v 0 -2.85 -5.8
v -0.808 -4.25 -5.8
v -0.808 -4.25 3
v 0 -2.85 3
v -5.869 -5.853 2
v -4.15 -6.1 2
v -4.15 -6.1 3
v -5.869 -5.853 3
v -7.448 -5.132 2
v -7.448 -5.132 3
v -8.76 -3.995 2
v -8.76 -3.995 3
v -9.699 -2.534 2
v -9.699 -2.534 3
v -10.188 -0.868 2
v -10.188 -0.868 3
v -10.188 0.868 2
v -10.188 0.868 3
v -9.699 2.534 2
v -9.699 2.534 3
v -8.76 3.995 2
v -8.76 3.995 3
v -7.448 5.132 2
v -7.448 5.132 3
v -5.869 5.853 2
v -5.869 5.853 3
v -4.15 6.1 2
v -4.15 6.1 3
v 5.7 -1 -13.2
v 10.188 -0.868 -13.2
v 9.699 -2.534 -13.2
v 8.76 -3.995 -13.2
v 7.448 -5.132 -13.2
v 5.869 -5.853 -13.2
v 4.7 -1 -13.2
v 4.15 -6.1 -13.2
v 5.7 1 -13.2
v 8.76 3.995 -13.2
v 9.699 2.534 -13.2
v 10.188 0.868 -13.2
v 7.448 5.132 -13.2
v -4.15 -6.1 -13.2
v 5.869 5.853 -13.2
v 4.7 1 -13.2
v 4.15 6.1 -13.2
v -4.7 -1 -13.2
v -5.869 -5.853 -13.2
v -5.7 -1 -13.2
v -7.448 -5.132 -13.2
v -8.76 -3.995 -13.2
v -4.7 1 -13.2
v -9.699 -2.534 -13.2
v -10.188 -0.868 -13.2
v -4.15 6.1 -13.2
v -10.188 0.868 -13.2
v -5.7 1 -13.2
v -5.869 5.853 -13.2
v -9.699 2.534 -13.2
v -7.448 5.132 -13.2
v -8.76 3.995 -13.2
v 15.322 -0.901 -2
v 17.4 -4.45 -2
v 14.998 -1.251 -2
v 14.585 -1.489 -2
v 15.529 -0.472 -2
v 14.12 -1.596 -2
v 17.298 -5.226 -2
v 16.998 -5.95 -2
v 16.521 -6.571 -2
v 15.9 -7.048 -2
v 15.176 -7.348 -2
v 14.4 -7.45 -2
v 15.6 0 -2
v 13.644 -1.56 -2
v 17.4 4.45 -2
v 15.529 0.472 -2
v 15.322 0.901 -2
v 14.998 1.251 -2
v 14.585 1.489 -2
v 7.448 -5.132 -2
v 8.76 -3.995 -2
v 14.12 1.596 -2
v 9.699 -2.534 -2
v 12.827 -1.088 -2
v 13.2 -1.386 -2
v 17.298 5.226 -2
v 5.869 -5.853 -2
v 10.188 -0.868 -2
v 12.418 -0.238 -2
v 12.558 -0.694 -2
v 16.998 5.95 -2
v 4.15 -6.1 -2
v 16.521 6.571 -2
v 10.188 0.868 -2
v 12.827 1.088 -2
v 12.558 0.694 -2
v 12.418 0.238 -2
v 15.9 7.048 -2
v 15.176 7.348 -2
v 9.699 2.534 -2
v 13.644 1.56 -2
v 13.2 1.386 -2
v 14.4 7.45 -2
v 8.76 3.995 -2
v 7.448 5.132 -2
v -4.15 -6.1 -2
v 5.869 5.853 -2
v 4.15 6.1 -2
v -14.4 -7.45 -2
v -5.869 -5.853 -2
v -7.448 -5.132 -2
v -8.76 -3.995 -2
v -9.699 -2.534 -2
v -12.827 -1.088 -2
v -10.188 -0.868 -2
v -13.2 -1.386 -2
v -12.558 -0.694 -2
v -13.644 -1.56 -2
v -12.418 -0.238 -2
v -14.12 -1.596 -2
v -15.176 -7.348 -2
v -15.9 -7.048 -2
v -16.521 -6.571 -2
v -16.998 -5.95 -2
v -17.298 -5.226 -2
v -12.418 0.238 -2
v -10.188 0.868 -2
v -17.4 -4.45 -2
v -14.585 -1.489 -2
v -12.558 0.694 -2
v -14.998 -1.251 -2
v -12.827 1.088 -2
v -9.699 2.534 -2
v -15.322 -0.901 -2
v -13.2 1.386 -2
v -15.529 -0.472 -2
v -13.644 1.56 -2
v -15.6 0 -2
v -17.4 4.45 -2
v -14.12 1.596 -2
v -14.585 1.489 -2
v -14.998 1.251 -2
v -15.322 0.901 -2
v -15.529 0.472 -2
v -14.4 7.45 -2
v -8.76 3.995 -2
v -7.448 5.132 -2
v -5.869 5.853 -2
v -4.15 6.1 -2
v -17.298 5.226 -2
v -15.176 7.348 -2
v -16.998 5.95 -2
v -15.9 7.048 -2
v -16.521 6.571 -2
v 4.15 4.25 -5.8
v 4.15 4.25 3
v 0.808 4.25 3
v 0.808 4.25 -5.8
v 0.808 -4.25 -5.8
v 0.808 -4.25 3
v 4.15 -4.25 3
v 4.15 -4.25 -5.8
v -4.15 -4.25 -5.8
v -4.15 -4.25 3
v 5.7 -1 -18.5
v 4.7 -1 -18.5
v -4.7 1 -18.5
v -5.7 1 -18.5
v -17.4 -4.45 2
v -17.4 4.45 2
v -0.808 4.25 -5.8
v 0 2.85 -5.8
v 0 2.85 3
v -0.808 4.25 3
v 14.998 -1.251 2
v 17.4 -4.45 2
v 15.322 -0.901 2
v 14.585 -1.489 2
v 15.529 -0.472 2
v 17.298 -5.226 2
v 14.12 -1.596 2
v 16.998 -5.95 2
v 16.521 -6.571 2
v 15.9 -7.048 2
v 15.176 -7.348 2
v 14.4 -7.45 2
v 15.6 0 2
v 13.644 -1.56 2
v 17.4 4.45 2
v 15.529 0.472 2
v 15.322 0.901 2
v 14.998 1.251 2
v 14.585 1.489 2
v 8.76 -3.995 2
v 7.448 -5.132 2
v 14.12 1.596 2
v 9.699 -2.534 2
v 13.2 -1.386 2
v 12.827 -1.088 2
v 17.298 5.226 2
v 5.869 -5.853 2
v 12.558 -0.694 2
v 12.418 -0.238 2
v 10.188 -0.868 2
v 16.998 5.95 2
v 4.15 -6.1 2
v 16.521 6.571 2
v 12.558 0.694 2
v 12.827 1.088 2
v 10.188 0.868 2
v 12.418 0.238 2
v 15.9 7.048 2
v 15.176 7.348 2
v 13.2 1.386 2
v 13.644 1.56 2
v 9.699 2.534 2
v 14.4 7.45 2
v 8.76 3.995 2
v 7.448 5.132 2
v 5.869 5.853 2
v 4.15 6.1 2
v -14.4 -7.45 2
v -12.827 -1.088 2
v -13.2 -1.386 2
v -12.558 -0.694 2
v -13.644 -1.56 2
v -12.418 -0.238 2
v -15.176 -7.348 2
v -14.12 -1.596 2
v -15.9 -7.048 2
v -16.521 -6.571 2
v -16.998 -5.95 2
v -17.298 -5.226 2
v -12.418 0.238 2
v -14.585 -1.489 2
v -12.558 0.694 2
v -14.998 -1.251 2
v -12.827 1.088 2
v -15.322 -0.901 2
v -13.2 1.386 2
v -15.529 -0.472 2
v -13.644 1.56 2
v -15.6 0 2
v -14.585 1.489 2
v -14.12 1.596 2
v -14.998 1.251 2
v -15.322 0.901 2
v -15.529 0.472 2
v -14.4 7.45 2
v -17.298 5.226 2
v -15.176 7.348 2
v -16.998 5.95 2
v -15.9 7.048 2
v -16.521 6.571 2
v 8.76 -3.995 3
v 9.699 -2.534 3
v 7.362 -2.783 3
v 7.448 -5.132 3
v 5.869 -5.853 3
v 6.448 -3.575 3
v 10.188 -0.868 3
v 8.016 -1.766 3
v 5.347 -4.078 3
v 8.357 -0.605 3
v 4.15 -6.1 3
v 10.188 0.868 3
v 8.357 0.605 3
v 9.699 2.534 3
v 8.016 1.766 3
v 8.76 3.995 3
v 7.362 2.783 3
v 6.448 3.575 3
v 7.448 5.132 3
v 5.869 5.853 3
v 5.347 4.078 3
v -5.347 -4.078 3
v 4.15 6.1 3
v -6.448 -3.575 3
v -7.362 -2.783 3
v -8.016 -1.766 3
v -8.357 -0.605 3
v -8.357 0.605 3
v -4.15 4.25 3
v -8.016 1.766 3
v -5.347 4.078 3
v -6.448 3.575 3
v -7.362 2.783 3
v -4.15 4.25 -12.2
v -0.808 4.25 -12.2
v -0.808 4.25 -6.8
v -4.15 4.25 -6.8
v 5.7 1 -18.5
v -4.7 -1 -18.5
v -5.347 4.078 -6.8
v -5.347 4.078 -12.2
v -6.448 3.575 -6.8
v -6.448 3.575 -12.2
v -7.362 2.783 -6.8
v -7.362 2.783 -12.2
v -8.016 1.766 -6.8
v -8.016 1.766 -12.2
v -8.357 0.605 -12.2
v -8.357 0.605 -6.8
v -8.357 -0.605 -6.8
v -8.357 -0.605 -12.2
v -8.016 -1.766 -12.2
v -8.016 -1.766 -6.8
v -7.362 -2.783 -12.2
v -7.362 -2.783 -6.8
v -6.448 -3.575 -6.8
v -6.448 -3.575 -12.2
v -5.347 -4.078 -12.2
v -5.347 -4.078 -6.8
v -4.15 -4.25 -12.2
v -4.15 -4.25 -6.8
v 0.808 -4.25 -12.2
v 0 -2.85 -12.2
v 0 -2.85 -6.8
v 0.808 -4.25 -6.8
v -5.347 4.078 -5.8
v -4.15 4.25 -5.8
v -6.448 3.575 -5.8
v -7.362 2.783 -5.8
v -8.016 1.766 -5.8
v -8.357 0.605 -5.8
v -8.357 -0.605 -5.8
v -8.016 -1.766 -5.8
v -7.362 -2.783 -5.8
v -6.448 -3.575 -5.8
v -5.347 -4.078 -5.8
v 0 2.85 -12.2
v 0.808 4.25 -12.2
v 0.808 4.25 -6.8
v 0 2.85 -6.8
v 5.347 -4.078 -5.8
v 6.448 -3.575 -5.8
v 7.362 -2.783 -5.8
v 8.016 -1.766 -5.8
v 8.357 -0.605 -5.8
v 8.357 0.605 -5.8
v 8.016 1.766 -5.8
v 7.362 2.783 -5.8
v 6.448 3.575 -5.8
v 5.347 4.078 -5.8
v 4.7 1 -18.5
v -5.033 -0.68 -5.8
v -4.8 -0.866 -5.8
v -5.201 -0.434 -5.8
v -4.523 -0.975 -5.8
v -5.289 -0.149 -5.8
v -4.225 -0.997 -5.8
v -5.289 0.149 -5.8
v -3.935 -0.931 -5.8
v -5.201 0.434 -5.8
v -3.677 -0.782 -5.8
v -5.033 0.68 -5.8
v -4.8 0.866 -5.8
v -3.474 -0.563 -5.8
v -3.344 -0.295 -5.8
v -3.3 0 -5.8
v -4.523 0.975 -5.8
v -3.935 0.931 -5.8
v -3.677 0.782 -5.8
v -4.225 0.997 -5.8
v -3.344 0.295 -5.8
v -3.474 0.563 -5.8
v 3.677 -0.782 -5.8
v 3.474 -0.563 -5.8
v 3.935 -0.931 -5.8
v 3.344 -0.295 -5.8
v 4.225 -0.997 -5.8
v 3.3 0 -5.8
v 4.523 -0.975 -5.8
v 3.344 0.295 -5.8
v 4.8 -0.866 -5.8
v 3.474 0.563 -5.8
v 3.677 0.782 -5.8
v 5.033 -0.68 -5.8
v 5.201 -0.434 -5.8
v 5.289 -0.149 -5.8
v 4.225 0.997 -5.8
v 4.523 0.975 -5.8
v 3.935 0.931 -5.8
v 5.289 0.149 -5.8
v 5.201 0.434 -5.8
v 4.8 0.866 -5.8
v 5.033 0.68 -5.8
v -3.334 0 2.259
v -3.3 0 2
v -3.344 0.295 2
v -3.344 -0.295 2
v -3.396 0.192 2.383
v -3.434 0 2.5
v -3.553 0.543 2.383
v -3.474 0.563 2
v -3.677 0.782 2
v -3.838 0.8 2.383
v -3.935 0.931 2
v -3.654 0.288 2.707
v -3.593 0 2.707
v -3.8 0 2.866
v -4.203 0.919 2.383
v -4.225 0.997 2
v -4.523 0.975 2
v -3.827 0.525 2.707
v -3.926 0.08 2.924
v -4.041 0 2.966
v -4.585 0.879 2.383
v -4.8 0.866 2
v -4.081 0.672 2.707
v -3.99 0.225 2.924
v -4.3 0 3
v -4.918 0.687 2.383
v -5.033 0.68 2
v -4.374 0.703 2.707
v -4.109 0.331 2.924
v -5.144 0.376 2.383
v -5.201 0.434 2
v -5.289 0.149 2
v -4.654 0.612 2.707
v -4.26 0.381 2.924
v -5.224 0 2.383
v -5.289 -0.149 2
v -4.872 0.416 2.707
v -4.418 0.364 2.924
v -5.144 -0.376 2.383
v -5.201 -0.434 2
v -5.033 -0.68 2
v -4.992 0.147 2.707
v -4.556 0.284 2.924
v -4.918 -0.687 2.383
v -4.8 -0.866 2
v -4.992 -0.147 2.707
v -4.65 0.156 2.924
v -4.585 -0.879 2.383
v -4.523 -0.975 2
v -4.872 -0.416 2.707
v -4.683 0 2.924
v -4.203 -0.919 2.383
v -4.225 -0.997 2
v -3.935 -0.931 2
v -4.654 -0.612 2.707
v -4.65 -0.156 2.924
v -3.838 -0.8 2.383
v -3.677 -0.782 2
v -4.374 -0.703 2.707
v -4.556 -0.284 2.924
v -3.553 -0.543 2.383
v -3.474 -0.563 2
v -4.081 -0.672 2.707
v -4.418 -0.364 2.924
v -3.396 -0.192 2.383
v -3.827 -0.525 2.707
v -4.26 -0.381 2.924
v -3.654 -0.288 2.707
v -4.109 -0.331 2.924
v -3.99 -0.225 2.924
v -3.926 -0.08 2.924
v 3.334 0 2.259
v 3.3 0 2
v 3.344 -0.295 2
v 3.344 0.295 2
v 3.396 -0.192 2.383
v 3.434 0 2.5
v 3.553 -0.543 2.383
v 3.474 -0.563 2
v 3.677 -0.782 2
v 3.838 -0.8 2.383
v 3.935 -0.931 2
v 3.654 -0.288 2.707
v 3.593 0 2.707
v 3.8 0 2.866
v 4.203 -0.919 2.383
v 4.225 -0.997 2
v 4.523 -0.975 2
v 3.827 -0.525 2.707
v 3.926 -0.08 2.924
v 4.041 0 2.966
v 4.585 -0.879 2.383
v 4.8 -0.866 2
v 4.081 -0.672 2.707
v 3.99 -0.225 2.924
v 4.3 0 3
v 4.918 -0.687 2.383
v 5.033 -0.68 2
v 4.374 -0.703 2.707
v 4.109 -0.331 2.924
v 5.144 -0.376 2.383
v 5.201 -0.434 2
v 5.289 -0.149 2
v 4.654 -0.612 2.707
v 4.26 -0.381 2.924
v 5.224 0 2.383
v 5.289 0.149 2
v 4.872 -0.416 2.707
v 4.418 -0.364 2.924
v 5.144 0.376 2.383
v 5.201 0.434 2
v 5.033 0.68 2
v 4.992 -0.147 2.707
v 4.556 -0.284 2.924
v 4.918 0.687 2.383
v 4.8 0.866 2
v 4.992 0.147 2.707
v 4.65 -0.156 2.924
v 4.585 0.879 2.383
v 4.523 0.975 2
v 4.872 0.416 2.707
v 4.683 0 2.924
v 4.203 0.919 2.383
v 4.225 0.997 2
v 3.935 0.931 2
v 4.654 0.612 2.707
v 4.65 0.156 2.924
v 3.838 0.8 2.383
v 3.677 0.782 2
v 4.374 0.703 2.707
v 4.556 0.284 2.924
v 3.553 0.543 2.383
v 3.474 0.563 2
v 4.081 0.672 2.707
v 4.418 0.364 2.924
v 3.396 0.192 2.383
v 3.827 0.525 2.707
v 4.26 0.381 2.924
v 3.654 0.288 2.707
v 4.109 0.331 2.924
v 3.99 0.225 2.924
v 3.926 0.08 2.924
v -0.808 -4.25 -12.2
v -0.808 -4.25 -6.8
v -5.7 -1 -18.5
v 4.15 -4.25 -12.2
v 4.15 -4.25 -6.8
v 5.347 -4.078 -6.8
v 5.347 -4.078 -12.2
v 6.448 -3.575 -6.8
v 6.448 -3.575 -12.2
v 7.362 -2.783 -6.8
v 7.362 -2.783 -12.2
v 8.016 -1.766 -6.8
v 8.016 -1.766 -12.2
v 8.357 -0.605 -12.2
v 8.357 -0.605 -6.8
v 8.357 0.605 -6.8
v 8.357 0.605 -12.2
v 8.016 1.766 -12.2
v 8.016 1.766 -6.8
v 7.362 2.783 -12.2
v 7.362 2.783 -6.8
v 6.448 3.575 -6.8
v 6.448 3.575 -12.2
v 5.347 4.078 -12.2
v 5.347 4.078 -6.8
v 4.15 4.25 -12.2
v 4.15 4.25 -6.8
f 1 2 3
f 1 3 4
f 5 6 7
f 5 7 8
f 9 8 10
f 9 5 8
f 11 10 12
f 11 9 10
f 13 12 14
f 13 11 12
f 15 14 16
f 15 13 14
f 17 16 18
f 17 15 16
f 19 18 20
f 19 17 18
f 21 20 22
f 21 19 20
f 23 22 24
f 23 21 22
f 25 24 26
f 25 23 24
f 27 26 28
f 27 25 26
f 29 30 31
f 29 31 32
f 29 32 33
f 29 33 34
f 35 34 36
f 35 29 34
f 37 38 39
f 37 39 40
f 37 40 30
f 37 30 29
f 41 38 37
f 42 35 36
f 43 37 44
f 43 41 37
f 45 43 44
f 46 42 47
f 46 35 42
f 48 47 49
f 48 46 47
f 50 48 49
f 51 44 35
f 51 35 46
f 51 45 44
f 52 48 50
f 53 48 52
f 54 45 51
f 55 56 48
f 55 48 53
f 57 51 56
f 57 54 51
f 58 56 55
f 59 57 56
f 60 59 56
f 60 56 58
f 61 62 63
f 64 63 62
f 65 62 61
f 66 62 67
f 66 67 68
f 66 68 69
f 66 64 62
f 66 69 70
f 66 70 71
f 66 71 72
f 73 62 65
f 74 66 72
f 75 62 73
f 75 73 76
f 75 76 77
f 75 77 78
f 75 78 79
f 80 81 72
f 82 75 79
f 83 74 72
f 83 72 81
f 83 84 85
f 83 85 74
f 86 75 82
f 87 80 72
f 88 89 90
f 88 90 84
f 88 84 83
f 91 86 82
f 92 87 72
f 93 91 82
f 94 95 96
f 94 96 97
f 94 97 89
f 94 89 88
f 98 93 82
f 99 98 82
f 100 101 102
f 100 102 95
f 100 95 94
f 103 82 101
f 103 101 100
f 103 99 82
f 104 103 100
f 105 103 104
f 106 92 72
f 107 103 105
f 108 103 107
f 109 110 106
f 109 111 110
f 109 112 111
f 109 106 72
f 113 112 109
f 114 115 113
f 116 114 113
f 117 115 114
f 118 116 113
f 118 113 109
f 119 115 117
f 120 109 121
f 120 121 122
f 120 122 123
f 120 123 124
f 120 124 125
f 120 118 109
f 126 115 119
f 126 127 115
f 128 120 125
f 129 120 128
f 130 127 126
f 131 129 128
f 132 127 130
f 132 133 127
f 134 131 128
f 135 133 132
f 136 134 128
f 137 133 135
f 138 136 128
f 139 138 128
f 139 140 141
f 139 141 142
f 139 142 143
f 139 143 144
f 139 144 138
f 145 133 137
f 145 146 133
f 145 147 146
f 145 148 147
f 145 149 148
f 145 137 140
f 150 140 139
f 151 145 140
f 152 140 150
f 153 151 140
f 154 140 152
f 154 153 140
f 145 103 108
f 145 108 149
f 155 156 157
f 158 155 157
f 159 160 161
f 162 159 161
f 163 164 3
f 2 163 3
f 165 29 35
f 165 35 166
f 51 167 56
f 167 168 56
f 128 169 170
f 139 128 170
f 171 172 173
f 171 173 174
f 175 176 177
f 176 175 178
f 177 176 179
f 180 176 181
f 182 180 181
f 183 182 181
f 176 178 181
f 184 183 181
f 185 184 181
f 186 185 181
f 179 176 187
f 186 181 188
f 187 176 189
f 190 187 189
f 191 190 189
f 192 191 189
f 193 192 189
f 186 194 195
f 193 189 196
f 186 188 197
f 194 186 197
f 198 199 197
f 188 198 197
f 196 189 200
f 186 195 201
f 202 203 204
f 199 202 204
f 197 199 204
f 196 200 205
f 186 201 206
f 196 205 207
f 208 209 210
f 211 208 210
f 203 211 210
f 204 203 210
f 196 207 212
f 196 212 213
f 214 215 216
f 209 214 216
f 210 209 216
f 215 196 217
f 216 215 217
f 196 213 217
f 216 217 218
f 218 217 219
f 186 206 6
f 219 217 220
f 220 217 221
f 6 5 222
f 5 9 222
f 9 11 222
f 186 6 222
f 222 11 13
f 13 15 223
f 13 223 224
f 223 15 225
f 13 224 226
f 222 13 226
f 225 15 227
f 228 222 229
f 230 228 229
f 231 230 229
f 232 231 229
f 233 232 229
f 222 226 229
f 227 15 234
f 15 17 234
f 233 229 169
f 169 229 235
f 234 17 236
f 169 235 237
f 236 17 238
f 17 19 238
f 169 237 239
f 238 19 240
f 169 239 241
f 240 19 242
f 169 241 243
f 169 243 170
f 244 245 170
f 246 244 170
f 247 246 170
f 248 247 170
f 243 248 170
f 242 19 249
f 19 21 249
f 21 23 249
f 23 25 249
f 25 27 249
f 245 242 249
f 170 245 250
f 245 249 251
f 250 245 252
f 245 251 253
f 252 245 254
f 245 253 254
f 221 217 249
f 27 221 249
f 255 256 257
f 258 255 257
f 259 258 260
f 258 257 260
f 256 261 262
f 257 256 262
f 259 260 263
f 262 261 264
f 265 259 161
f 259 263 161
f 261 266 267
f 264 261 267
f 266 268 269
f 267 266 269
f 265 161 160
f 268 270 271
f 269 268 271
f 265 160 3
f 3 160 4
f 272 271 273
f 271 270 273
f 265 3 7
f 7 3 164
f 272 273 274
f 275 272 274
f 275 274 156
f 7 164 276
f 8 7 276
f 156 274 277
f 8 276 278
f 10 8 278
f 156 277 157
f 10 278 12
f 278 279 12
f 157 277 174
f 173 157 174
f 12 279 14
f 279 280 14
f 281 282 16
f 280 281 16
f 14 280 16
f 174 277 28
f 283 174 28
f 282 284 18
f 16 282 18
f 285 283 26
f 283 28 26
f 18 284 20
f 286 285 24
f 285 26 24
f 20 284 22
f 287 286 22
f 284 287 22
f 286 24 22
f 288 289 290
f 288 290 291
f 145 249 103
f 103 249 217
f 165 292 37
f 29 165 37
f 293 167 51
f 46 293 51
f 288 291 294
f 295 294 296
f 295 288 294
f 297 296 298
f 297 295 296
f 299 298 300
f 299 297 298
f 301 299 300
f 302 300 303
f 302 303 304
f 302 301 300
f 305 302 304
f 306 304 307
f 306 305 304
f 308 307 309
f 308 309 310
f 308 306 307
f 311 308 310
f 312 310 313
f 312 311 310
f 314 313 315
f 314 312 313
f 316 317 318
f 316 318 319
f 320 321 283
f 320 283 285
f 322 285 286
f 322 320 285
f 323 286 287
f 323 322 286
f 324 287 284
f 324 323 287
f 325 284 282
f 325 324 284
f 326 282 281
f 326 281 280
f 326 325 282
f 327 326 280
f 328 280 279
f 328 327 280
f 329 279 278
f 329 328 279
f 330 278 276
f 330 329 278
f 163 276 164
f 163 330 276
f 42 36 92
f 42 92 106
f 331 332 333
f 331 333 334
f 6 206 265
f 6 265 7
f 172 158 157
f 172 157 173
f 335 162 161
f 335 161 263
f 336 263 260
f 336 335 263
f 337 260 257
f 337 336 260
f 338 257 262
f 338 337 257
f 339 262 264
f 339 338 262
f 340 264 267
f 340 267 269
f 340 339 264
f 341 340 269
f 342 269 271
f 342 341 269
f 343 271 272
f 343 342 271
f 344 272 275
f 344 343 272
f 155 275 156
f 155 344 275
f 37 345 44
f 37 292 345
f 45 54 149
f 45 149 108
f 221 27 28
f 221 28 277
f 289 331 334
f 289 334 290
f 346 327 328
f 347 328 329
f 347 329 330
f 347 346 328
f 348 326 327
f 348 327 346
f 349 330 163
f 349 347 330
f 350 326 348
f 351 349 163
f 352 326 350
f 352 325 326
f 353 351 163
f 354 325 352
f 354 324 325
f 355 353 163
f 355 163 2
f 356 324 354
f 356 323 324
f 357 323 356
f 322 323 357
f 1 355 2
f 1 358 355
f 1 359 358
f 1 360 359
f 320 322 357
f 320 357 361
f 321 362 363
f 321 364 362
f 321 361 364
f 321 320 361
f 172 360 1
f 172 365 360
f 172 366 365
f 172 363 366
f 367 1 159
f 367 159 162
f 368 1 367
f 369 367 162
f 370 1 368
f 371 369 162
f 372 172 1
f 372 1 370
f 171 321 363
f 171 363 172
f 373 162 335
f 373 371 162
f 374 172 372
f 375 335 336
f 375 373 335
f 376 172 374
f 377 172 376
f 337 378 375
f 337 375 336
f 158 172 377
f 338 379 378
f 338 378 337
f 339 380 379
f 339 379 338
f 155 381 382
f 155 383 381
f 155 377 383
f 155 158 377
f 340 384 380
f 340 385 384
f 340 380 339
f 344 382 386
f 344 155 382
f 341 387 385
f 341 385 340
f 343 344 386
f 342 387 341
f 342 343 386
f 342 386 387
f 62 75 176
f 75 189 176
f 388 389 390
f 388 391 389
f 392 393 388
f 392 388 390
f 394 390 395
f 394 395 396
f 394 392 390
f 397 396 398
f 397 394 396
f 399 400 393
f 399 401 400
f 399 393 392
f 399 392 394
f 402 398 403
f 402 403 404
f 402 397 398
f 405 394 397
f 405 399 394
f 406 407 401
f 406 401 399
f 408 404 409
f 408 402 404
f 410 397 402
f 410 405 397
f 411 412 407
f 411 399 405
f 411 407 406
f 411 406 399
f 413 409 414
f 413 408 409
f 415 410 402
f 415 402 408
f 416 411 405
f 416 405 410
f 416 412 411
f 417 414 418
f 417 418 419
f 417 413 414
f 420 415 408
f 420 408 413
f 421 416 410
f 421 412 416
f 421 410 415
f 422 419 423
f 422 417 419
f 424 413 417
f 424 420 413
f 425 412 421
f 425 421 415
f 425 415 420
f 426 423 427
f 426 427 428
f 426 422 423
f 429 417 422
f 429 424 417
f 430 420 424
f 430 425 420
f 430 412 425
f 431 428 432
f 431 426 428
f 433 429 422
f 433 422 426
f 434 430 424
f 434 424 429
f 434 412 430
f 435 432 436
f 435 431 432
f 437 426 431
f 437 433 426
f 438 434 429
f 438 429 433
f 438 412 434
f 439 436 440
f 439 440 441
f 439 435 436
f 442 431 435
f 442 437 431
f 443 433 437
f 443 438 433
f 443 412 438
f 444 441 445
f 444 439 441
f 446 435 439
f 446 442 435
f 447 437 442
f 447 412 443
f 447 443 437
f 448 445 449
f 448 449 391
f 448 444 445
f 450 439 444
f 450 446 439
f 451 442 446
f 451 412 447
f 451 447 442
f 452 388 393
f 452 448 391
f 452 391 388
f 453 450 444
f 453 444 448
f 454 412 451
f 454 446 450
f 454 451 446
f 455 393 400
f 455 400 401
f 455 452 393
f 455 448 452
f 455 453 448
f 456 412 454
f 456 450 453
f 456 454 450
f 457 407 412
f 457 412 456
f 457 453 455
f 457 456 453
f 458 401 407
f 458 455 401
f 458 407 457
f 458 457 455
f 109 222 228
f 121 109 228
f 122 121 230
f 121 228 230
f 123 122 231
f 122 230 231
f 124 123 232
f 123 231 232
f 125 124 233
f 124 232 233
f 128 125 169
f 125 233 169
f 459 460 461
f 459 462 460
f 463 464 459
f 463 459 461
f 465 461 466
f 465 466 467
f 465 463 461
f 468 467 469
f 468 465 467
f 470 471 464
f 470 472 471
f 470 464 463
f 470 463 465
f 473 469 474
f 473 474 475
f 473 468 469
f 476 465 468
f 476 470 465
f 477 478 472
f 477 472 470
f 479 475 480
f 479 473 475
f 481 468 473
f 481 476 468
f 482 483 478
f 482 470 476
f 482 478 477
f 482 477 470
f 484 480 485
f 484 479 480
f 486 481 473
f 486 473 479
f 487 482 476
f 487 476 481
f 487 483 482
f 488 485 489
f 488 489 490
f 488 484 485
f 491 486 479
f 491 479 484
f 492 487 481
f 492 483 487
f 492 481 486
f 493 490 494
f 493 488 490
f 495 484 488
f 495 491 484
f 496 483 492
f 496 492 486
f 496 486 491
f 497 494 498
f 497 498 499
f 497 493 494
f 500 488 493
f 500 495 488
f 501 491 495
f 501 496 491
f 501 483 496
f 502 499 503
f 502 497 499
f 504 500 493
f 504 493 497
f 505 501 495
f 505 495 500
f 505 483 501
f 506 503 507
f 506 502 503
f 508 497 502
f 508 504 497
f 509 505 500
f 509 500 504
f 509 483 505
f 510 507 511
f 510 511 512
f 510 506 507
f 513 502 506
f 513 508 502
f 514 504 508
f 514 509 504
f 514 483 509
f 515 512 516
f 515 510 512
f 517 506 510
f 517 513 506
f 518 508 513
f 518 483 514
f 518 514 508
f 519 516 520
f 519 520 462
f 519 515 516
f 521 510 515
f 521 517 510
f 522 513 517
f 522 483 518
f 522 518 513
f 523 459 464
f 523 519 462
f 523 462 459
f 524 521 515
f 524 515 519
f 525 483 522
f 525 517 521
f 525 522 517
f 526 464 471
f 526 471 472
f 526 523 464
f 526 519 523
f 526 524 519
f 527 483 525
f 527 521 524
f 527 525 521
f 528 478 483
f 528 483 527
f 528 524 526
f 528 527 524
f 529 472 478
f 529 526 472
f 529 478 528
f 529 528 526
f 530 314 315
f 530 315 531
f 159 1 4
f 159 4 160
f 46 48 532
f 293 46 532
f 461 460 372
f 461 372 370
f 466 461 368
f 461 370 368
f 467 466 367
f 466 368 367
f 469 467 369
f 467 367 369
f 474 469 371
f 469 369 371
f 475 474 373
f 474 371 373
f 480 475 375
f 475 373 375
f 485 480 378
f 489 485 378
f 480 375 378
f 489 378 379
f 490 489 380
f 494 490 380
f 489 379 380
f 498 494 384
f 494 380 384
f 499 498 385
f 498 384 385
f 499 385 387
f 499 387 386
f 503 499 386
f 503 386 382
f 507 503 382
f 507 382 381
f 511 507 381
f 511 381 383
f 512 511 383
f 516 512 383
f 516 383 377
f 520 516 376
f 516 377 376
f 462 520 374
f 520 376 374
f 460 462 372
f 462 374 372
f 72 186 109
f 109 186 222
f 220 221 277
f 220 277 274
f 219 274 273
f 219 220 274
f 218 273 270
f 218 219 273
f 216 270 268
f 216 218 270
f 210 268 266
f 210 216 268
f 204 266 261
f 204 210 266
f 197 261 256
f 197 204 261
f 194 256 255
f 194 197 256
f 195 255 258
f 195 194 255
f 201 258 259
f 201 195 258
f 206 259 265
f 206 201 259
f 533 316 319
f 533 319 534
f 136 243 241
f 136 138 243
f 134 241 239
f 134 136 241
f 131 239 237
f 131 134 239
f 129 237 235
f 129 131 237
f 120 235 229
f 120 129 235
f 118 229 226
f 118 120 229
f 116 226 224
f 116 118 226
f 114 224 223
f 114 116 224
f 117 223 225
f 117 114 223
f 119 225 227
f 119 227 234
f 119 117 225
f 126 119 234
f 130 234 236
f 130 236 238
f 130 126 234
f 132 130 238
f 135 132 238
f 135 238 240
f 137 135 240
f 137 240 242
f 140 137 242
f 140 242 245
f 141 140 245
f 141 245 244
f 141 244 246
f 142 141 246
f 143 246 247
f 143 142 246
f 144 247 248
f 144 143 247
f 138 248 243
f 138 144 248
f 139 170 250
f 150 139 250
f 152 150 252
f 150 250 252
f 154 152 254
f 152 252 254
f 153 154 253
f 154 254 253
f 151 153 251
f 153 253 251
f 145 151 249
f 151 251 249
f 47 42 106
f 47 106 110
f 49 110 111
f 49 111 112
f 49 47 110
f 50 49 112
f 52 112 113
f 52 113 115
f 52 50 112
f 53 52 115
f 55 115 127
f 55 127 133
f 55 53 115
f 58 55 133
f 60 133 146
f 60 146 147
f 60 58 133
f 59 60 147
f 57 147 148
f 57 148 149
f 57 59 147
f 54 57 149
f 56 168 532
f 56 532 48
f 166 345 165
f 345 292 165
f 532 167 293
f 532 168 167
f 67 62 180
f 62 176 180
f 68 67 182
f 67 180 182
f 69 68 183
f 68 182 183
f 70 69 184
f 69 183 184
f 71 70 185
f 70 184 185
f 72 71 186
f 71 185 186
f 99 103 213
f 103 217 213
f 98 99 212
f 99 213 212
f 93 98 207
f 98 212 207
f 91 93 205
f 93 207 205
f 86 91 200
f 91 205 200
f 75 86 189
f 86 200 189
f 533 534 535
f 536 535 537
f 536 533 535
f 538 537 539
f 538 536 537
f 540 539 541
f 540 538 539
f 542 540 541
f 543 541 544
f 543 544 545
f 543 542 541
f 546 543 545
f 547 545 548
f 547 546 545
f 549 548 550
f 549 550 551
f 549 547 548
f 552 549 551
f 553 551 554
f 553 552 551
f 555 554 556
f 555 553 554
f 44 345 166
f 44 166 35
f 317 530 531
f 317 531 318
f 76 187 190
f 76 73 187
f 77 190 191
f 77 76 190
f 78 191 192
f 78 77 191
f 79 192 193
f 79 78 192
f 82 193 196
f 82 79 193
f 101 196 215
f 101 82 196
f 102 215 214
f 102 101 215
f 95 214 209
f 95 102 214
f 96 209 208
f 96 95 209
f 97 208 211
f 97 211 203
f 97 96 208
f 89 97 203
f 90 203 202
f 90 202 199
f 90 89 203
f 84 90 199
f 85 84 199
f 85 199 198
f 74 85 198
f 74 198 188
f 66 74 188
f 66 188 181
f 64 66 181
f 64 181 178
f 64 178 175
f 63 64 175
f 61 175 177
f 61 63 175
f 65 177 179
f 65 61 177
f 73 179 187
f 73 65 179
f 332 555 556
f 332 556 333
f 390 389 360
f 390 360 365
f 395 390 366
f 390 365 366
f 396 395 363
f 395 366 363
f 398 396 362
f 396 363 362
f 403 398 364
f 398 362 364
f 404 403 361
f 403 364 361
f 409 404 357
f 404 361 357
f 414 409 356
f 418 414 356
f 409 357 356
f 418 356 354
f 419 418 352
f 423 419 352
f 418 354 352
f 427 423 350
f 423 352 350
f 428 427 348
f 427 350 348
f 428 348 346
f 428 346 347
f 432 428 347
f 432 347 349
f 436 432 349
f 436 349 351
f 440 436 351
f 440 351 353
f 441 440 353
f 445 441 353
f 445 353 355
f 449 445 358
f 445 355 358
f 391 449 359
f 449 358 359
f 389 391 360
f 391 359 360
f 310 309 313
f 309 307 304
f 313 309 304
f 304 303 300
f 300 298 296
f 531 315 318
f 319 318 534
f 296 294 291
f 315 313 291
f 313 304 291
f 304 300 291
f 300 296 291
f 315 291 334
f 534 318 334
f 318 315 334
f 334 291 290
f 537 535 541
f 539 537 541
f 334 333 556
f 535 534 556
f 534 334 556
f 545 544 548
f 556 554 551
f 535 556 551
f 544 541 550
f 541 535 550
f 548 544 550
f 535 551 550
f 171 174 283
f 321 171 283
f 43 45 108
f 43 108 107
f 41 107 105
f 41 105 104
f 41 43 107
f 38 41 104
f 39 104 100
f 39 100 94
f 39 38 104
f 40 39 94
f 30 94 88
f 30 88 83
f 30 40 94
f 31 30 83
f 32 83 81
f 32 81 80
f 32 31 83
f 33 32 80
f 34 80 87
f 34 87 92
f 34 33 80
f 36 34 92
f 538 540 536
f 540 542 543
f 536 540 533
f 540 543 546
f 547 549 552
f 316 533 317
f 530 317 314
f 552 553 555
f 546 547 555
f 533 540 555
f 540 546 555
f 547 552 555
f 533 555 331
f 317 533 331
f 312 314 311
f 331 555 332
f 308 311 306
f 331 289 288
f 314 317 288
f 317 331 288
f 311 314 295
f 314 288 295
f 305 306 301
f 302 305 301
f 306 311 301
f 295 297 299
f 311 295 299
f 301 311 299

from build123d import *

# Parameters (mm, degrees)
SKETCH1_R                = 1.6
BOSS_EXTRUDE1_DEPTH      = 2
BOSS_EXTRUDE2_DEPTH      = 1
BOSS_EXTRUDE2_DEPTH_BACK = 15.2
BOSS_EXTRUDE3_START      = -9.8
BOSS_EXTRUDE3_DEPTH      = 1
BOSS_EXTRUDE4_START      = 5.2
BOSS_EXTRUDE4_DEPTH      = 0.5
BOSS_EXTRUDE6_DEPTH      = 1
SKETCH6_R                = 1
BOSS_EXTRUDE7_DEPTH      = 8.8
FILLET1_R                = 1


with BuildPart() as part:
    # Sketch1 → Boss-Extrude1 (new, symmetric)
    with BuildSketch(Plane.XY):
        with BuildLine():
            Line((-14.4, 7.45), (14.4, 7.45))
            ThreePointArc((14.4, 7.45), (16.521320344, 6.571320344), (17.4, 4.45))
            Line((17.4, 4.45), (17.4, -4.45))
            ThreePointArc((17.4, -4.45), (16.521320344, -6.571320344), (14.4, -7.45))
            Line((14.4, -7.45), (-14.4, -7.45))
            ThreePointArc((-14.4, -7.45), (-16.521320344, -6.571320344), (-17.4, -4.45))
            Line((-17.4, -4.45), (-17.4, 4.45))
            ThreePointArc((-17.4, 4.45), (-16.521320344, 6.571320344), (-14.4, 7.45))
        make_face()
        with Locations((14, 0)):
            Circle(SKETCH1_R, mode=Mode.SUBTRACT)
        with Locations(Location((-14, 0, 0), (0, 0, 180))):
            Circle(SKETCH1_R, mode=Mode.SUBTRACT)
        with BuildLine():
            Line((-4.15, 4.25), (-0.808290377, 4.25))
            Line((-0.808290377, 4.25), (0, 2.85))
            Line((0, 2.85), (0.808290377, 4.25))
            Line((0.808290377, 4.25), (4.15, 4.25))
            ThreePointArc((4.15, 4.25), (8.4, 0), (4.15, -4.25))
            Line((4.15, -4.25), (0.808290377, -4.25))
            Line((0.808290377, -4.25), (0, -2.85))
            Line((0, -2.85), (-0.808290377, -4.25))
            Line((-0.808290377, -4.25), (-4.15, -4.25))
            ThreePointArc((-4.15, -4.25), (-8.4, 0), (-4.15, 4.25))
        make_face(mode=Mode.SUBTRACT)
    extrude(amount=BOSS_EXTRUDE1_DEPTH, both=True)

    # Sketch2 → Boss-Extrude2 (add, two sides: drawn at the far end of the back side and taken through both)
    with BuildSketch(Plane.XY.offset(2).offset(-BOSS_EXTRUDE2_DEPTH_BACK)):
        with BuildLine():
            Line((-4.15, 6.1), (4.15, 6.1))
            ThreePointArc((4.15, 6.1), (10.25, 0), (4.15, -6.1))
            Line((4.15, -6.1), (-4.15, -6.1))
            ThreePointArc((-4.15, -6.1), (-10.25, 0), (-4.15, 6.1))
        make_face()
        with BuildLine():
            Line((0.808290377, 4.25), (0, 2.85))
            Line((0, 2.85), (-0.808290377, 4.25))
            Line((-0.808290377, 4.25), (-4.15, 4.25))
            ThreePointArc((-4.15, 4.25), (-8.4, 0), (-4.15, -4.25))
            Line((-4.15, -4.25), (-0.808290377, -4.25))
            Line((-0.808290377, -4.25), (0, -2.85))
            Line((0, -2.85), (0.808290377, -4.25))
            Line((0.808290377, -4.25), (4.15, -4.25))
            ThreePointArc((4.15, -4.25), (8.4, 0), (4.15, 4.25))
            Line((4.15, 4.25), (0.808290377, 4.25))
        make_face(mode=Mode.SUBTRACT)
    extrude(amount=BOSS_EXTRUDE2_DEPTH + BOSS_EXTRUDE2_DEPTH_BACK)

    # Sketch3 → Boss-Extrude3 (add)
    with BuildSketch(Plane.XY.offset(3).offset(BOSS_EXTRUDE3_START)):
        with BuildLine():
            Line((0.808290377, 4.25), (0, 2.85))
            Line((0, 2.85), (-0.808290377, 4.25))
            Line((-0.808290377, 4.25), (-4.15, 4.25))
            ThreePointArc((-4.15, 4.25), (-8.4, 0), (-4.15, -4.25))
            Line((-4.15, -4.25), (-0.808290377, -4.25))
            Line((-0.808290377, -4.25), (0, -2.85))
            Line((0, -2.85), (0.808290377, -4.25))
            Line((0.808290377, -4.25), (4.15, -4.25))
            ThreePointArc((4.15, -4.25), (8.4, 0), (4.15, 4.25))
            Line((4.15, 4.25), (0.808290377, 4.25))
        make_face()
    extrude(amount=BOSS_EXTRUDE3_DEPTH)



with BuildPart() as body_2:
    # Sketch4 → Boss-Extrude4 (new, symmetric)
    with BuildSketch(Plane(origin=(0, 0, 0), x_dir=(0, 0, -1), z_dir=(1, 0, 0)).offset(BOSS_EXTRUDE4_START)):
        Polygon((13.2, 1), (15.8, 1), (18.5, 1), (18.5, -1), (13.8, -1), (13.2, -1), align=None)
    boss_extrude4 = extrude(amount=BOSS_EXTRUDE4_DEPTH, both=True)


with BuildPart() as part_1:
    add(part.part)

    add(body_2.part)  # Boss-Extrude6 merges body 2
    # Sketch5 → Boss-Extrude6 (add)
    with BuildSketch(Plane(origin=(0, 0, -13.2), x_dir=(-1, 0, 0), z_dir=(0, 0, -1))):
        with BuildLine():
            Line((4.15, 6.1), (-4.15, 6.1))
            ThreePointArc((-4.15, 6.1), (-10.25, 0), (-4.15, -6.1))
            Line((-4.15, -6.1), (4.15, -6.1))
            ThreePointArc((4.15, -6.1), (10.25, 0), (4.15, 6.1))
        make_face()
    extrude(amount=-BOSS_EXTRUDE6_DEPTH)

    # Mirror2: Boss-Extrude4 across plane
    add(boss_extrude4.mirror(Plane(origin=(0, 0, 0), x_dir=(0, 0, 1), z_dir=(1, 0, 0))))

    # Sketch6 → Boss-Extrude7 (add)
    with BuildSketch(Plane.XY.offset(-5.8)):
        with Locations((-4.3, 0)):
            Circle(SKETCH6_R)
        with Locations(Location((4.3, 0, 0), (0, 0, 180))):
            Circle(SKETCH6_R)
    extrude(amount=BOSS_EXTRUDE7_DEPTH)

    # Fillet1
    fillet1_edges = [part_1.edges().sort_by_distance(p)[0] for p in [
        (-5.3, 0, 3),
        (5.3, 0, 3),
    ]]
    fillet(fillet1_edges, radius=FILLET1_R)


solid = part_1.part
